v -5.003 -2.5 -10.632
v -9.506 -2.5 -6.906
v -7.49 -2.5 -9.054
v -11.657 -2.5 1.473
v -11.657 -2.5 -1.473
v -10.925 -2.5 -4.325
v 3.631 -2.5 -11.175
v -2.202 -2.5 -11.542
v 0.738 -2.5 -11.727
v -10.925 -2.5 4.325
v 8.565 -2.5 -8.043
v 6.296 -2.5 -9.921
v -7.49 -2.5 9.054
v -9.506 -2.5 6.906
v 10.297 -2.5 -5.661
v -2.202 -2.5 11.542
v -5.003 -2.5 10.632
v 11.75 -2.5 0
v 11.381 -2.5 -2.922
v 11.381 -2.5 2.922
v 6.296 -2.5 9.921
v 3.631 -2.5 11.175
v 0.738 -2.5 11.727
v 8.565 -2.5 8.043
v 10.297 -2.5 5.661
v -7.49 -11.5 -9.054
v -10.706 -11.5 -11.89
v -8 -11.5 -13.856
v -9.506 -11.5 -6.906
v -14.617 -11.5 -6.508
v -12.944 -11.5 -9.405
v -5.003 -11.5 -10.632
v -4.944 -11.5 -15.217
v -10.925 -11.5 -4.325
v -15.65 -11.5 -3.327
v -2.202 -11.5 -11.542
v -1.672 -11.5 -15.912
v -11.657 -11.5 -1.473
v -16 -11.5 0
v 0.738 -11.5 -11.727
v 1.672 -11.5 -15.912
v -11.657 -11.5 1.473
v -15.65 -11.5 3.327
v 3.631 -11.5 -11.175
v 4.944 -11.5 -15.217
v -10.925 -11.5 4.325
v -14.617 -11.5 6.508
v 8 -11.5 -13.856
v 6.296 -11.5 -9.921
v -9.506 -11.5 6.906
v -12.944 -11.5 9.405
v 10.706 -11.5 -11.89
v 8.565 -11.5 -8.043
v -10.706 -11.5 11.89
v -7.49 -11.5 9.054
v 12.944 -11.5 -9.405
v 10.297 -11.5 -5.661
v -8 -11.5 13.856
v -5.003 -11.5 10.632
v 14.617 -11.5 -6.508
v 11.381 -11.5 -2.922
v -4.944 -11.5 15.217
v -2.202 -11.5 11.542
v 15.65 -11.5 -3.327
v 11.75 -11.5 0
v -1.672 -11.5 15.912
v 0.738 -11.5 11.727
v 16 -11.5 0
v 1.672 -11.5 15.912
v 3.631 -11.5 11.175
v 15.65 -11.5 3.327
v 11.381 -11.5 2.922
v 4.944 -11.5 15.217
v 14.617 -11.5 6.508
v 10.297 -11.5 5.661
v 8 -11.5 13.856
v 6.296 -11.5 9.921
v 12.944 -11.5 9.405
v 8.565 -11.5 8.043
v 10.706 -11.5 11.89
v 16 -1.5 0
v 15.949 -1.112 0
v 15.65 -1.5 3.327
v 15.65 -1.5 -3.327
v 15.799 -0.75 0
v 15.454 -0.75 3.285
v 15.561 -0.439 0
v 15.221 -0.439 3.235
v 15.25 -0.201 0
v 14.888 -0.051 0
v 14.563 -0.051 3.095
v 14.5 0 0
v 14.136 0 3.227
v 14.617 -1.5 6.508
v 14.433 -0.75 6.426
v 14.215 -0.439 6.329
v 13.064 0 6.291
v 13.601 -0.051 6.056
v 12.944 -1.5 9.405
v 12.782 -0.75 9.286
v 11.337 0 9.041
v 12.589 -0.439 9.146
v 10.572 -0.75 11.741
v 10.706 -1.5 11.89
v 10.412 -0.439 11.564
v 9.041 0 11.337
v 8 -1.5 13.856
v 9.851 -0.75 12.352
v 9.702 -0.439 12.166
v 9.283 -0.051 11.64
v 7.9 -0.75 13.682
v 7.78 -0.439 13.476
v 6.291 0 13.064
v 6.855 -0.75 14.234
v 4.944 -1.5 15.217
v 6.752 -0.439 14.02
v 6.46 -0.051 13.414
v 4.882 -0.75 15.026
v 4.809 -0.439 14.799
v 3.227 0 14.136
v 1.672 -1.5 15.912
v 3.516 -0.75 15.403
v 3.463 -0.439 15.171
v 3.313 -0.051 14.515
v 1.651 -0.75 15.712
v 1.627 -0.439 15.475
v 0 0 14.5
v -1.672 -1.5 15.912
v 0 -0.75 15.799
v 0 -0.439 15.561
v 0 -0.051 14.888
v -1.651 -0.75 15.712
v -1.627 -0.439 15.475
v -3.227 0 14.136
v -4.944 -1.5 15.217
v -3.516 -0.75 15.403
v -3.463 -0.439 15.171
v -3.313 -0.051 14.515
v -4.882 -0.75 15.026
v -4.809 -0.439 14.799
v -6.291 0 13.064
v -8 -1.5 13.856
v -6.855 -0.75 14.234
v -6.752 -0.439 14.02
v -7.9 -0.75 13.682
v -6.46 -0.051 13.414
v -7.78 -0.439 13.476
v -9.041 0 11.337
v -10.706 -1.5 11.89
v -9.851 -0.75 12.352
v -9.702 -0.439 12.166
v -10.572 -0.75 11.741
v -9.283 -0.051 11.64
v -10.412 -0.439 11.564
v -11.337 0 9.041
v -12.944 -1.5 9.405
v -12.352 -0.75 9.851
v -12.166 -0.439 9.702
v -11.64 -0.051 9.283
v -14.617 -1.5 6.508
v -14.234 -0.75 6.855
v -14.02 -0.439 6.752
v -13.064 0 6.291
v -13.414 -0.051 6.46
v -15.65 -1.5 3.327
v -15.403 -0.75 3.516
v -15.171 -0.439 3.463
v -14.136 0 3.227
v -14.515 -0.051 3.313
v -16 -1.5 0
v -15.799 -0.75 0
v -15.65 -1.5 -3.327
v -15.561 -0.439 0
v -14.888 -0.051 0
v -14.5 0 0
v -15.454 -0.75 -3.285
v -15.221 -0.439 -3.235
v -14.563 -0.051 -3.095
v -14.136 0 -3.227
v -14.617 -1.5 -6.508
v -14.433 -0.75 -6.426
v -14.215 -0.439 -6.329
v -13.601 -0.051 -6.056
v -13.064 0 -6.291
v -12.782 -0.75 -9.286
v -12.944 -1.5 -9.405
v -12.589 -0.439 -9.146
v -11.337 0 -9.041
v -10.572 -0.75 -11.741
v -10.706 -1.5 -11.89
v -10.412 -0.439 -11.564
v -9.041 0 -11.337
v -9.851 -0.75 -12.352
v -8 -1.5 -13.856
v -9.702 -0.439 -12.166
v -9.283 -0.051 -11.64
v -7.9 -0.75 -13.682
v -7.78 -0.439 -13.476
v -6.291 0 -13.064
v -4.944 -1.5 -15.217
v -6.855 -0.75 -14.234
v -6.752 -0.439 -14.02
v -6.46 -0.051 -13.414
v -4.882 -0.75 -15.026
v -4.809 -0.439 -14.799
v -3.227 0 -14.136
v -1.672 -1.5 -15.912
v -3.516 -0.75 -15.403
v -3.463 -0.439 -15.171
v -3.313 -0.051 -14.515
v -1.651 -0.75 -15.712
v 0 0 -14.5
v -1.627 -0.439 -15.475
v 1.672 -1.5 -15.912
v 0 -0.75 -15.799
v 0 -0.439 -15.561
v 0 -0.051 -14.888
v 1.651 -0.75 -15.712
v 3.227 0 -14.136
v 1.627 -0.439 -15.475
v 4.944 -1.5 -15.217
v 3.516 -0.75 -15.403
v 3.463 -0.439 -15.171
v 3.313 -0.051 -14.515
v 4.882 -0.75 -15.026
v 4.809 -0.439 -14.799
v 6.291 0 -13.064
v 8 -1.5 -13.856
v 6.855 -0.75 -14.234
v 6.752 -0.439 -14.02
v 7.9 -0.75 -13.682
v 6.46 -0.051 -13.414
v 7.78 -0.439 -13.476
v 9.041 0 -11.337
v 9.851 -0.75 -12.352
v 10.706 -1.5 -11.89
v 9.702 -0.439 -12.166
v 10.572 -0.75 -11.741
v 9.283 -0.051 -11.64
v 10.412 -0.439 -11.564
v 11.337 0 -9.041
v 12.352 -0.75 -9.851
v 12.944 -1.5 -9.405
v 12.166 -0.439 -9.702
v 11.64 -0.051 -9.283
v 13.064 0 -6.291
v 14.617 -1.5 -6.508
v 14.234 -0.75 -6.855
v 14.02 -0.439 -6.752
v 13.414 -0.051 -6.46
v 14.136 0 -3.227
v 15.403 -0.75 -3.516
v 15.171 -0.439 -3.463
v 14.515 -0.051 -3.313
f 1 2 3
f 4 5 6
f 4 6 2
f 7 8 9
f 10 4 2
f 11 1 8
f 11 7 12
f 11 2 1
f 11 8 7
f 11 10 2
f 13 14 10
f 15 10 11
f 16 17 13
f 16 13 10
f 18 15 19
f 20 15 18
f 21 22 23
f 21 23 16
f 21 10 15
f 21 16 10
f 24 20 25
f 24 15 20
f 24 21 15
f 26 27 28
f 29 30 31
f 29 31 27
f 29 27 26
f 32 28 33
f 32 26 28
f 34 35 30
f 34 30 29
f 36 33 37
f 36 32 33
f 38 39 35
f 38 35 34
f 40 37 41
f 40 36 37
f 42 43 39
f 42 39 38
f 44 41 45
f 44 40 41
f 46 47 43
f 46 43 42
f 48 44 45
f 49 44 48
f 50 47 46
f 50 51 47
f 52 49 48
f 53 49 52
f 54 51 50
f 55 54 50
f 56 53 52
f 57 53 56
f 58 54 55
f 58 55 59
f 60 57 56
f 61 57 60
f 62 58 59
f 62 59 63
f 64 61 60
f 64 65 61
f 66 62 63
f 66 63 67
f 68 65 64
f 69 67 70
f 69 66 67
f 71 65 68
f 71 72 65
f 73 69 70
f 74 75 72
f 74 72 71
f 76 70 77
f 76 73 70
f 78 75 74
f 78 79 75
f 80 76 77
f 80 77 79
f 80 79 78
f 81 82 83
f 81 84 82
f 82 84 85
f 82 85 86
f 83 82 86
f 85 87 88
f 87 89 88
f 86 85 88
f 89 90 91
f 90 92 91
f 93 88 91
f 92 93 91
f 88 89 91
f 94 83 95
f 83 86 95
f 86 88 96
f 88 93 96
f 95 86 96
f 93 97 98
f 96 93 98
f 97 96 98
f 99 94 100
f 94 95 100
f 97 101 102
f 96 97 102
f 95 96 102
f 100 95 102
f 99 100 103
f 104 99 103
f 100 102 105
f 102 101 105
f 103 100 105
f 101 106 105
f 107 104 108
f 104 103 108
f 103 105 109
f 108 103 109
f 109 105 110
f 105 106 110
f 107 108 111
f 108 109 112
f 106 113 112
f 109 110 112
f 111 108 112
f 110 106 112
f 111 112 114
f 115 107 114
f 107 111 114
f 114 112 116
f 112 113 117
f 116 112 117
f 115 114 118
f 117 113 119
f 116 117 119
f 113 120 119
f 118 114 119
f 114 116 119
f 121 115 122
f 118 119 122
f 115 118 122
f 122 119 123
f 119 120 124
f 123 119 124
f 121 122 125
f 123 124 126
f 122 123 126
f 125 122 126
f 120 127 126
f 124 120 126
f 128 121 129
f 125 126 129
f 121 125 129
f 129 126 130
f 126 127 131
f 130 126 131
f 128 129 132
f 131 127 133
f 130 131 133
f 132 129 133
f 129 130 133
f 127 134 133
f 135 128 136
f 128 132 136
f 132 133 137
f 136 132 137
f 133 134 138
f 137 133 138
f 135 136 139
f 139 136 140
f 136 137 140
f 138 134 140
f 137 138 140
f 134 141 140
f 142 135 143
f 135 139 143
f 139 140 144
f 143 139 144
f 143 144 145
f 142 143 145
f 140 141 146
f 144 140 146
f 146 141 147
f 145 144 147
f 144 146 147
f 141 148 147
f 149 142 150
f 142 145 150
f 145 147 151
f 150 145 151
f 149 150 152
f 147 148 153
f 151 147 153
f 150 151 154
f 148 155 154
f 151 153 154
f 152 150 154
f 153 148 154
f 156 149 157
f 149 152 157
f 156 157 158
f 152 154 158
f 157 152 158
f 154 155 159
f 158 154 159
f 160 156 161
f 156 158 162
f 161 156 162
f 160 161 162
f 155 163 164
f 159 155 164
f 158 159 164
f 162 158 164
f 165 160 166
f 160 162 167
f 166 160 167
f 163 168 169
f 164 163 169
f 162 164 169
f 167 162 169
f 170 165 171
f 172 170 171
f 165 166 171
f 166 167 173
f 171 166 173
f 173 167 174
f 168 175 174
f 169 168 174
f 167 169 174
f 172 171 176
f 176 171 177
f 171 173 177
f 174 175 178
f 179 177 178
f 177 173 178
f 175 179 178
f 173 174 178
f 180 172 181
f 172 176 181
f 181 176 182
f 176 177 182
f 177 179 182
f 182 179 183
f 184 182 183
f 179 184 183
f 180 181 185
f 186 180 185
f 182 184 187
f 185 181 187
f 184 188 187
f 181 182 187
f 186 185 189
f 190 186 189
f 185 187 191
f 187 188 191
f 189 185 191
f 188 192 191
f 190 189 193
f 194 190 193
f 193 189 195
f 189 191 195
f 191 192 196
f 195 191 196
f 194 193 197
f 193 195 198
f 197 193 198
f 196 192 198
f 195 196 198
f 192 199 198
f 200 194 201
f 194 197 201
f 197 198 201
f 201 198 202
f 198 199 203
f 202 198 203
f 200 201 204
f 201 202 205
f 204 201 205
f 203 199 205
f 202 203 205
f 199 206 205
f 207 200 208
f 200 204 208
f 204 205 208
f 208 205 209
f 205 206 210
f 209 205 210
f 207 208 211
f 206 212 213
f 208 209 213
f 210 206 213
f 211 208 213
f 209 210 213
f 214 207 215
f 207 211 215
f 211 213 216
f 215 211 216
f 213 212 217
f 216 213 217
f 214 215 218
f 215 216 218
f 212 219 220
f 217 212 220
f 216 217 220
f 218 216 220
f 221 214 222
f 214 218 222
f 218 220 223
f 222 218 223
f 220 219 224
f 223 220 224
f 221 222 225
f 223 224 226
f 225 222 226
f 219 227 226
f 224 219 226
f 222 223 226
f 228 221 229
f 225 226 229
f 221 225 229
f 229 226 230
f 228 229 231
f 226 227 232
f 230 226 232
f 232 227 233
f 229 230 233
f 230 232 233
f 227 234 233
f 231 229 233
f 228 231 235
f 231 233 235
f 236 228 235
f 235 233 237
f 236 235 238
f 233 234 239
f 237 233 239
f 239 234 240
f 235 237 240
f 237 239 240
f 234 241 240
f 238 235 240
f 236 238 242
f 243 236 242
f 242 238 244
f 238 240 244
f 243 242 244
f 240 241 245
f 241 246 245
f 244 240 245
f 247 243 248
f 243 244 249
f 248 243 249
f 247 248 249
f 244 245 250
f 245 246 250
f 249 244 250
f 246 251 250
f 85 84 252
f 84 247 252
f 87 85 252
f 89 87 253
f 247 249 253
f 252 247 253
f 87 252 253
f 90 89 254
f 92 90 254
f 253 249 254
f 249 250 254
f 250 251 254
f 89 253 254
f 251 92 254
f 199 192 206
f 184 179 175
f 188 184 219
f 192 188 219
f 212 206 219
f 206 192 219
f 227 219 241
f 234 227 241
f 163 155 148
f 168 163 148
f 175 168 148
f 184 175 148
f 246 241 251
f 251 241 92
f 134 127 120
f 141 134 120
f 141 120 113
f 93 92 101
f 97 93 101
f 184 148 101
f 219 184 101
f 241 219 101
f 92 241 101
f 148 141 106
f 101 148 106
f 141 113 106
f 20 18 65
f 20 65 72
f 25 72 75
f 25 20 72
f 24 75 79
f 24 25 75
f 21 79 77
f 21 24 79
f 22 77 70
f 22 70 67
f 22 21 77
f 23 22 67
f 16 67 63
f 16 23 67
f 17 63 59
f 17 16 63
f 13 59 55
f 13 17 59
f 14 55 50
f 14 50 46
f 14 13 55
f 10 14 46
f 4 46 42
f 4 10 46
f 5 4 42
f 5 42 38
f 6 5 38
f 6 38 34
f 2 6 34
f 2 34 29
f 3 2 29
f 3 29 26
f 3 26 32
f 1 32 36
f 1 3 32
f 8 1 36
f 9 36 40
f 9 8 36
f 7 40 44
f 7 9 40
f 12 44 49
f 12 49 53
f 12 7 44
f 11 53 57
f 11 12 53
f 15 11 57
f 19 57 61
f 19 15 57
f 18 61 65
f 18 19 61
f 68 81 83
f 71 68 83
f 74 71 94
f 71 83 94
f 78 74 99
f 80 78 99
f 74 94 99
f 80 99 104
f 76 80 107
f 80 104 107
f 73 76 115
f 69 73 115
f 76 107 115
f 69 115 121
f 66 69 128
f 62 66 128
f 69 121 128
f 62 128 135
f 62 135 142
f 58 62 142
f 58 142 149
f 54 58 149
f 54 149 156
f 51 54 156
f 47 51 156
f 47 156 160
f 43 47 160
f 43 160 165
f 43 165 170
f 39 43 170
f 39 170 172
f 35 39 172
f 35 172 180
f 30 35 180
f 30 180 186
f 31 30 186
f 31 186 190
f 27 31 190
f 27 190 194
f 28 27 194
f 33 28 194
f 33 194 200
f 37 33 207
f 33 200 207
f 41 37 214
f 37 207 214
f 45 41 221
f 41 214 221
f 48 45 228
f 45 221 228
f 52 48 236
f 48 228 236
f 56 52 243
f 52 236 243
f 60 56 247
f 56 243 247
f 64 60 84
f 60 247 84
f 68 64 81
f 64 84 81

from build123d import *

# Parameters (mm, degrees)
F0_R     = 16
F1_DEPTH = 2.5
F2_R     = 16
F2_R_2   = 11.75
F3_DEPTH = 9
F4_R     = 1.5


with BuildPart() as f1:
    # F0 (on Front) → F1 (new body)
    with BuildSketch(Plane.XZ):
        Circle(F0_R)
    extrude(amount=F1_DEPTH)

    # F2 (on face) → F3 (join)
    with BuildSketch(Plane.XZ.offset(2.5)):
        Circle(F2_R)
        Circle(F2_R_2, mode=Mode.SUBTRACT)
    extrude(amount=F3_DEPTH)

    # F4
    f4_edges = [f1.edges().sort_by_distance(p)[0] for p in [
        (-16, 0, 0),
    ]]
    fillet(f4_edges, radius=F4_R)


solid = f1.part
